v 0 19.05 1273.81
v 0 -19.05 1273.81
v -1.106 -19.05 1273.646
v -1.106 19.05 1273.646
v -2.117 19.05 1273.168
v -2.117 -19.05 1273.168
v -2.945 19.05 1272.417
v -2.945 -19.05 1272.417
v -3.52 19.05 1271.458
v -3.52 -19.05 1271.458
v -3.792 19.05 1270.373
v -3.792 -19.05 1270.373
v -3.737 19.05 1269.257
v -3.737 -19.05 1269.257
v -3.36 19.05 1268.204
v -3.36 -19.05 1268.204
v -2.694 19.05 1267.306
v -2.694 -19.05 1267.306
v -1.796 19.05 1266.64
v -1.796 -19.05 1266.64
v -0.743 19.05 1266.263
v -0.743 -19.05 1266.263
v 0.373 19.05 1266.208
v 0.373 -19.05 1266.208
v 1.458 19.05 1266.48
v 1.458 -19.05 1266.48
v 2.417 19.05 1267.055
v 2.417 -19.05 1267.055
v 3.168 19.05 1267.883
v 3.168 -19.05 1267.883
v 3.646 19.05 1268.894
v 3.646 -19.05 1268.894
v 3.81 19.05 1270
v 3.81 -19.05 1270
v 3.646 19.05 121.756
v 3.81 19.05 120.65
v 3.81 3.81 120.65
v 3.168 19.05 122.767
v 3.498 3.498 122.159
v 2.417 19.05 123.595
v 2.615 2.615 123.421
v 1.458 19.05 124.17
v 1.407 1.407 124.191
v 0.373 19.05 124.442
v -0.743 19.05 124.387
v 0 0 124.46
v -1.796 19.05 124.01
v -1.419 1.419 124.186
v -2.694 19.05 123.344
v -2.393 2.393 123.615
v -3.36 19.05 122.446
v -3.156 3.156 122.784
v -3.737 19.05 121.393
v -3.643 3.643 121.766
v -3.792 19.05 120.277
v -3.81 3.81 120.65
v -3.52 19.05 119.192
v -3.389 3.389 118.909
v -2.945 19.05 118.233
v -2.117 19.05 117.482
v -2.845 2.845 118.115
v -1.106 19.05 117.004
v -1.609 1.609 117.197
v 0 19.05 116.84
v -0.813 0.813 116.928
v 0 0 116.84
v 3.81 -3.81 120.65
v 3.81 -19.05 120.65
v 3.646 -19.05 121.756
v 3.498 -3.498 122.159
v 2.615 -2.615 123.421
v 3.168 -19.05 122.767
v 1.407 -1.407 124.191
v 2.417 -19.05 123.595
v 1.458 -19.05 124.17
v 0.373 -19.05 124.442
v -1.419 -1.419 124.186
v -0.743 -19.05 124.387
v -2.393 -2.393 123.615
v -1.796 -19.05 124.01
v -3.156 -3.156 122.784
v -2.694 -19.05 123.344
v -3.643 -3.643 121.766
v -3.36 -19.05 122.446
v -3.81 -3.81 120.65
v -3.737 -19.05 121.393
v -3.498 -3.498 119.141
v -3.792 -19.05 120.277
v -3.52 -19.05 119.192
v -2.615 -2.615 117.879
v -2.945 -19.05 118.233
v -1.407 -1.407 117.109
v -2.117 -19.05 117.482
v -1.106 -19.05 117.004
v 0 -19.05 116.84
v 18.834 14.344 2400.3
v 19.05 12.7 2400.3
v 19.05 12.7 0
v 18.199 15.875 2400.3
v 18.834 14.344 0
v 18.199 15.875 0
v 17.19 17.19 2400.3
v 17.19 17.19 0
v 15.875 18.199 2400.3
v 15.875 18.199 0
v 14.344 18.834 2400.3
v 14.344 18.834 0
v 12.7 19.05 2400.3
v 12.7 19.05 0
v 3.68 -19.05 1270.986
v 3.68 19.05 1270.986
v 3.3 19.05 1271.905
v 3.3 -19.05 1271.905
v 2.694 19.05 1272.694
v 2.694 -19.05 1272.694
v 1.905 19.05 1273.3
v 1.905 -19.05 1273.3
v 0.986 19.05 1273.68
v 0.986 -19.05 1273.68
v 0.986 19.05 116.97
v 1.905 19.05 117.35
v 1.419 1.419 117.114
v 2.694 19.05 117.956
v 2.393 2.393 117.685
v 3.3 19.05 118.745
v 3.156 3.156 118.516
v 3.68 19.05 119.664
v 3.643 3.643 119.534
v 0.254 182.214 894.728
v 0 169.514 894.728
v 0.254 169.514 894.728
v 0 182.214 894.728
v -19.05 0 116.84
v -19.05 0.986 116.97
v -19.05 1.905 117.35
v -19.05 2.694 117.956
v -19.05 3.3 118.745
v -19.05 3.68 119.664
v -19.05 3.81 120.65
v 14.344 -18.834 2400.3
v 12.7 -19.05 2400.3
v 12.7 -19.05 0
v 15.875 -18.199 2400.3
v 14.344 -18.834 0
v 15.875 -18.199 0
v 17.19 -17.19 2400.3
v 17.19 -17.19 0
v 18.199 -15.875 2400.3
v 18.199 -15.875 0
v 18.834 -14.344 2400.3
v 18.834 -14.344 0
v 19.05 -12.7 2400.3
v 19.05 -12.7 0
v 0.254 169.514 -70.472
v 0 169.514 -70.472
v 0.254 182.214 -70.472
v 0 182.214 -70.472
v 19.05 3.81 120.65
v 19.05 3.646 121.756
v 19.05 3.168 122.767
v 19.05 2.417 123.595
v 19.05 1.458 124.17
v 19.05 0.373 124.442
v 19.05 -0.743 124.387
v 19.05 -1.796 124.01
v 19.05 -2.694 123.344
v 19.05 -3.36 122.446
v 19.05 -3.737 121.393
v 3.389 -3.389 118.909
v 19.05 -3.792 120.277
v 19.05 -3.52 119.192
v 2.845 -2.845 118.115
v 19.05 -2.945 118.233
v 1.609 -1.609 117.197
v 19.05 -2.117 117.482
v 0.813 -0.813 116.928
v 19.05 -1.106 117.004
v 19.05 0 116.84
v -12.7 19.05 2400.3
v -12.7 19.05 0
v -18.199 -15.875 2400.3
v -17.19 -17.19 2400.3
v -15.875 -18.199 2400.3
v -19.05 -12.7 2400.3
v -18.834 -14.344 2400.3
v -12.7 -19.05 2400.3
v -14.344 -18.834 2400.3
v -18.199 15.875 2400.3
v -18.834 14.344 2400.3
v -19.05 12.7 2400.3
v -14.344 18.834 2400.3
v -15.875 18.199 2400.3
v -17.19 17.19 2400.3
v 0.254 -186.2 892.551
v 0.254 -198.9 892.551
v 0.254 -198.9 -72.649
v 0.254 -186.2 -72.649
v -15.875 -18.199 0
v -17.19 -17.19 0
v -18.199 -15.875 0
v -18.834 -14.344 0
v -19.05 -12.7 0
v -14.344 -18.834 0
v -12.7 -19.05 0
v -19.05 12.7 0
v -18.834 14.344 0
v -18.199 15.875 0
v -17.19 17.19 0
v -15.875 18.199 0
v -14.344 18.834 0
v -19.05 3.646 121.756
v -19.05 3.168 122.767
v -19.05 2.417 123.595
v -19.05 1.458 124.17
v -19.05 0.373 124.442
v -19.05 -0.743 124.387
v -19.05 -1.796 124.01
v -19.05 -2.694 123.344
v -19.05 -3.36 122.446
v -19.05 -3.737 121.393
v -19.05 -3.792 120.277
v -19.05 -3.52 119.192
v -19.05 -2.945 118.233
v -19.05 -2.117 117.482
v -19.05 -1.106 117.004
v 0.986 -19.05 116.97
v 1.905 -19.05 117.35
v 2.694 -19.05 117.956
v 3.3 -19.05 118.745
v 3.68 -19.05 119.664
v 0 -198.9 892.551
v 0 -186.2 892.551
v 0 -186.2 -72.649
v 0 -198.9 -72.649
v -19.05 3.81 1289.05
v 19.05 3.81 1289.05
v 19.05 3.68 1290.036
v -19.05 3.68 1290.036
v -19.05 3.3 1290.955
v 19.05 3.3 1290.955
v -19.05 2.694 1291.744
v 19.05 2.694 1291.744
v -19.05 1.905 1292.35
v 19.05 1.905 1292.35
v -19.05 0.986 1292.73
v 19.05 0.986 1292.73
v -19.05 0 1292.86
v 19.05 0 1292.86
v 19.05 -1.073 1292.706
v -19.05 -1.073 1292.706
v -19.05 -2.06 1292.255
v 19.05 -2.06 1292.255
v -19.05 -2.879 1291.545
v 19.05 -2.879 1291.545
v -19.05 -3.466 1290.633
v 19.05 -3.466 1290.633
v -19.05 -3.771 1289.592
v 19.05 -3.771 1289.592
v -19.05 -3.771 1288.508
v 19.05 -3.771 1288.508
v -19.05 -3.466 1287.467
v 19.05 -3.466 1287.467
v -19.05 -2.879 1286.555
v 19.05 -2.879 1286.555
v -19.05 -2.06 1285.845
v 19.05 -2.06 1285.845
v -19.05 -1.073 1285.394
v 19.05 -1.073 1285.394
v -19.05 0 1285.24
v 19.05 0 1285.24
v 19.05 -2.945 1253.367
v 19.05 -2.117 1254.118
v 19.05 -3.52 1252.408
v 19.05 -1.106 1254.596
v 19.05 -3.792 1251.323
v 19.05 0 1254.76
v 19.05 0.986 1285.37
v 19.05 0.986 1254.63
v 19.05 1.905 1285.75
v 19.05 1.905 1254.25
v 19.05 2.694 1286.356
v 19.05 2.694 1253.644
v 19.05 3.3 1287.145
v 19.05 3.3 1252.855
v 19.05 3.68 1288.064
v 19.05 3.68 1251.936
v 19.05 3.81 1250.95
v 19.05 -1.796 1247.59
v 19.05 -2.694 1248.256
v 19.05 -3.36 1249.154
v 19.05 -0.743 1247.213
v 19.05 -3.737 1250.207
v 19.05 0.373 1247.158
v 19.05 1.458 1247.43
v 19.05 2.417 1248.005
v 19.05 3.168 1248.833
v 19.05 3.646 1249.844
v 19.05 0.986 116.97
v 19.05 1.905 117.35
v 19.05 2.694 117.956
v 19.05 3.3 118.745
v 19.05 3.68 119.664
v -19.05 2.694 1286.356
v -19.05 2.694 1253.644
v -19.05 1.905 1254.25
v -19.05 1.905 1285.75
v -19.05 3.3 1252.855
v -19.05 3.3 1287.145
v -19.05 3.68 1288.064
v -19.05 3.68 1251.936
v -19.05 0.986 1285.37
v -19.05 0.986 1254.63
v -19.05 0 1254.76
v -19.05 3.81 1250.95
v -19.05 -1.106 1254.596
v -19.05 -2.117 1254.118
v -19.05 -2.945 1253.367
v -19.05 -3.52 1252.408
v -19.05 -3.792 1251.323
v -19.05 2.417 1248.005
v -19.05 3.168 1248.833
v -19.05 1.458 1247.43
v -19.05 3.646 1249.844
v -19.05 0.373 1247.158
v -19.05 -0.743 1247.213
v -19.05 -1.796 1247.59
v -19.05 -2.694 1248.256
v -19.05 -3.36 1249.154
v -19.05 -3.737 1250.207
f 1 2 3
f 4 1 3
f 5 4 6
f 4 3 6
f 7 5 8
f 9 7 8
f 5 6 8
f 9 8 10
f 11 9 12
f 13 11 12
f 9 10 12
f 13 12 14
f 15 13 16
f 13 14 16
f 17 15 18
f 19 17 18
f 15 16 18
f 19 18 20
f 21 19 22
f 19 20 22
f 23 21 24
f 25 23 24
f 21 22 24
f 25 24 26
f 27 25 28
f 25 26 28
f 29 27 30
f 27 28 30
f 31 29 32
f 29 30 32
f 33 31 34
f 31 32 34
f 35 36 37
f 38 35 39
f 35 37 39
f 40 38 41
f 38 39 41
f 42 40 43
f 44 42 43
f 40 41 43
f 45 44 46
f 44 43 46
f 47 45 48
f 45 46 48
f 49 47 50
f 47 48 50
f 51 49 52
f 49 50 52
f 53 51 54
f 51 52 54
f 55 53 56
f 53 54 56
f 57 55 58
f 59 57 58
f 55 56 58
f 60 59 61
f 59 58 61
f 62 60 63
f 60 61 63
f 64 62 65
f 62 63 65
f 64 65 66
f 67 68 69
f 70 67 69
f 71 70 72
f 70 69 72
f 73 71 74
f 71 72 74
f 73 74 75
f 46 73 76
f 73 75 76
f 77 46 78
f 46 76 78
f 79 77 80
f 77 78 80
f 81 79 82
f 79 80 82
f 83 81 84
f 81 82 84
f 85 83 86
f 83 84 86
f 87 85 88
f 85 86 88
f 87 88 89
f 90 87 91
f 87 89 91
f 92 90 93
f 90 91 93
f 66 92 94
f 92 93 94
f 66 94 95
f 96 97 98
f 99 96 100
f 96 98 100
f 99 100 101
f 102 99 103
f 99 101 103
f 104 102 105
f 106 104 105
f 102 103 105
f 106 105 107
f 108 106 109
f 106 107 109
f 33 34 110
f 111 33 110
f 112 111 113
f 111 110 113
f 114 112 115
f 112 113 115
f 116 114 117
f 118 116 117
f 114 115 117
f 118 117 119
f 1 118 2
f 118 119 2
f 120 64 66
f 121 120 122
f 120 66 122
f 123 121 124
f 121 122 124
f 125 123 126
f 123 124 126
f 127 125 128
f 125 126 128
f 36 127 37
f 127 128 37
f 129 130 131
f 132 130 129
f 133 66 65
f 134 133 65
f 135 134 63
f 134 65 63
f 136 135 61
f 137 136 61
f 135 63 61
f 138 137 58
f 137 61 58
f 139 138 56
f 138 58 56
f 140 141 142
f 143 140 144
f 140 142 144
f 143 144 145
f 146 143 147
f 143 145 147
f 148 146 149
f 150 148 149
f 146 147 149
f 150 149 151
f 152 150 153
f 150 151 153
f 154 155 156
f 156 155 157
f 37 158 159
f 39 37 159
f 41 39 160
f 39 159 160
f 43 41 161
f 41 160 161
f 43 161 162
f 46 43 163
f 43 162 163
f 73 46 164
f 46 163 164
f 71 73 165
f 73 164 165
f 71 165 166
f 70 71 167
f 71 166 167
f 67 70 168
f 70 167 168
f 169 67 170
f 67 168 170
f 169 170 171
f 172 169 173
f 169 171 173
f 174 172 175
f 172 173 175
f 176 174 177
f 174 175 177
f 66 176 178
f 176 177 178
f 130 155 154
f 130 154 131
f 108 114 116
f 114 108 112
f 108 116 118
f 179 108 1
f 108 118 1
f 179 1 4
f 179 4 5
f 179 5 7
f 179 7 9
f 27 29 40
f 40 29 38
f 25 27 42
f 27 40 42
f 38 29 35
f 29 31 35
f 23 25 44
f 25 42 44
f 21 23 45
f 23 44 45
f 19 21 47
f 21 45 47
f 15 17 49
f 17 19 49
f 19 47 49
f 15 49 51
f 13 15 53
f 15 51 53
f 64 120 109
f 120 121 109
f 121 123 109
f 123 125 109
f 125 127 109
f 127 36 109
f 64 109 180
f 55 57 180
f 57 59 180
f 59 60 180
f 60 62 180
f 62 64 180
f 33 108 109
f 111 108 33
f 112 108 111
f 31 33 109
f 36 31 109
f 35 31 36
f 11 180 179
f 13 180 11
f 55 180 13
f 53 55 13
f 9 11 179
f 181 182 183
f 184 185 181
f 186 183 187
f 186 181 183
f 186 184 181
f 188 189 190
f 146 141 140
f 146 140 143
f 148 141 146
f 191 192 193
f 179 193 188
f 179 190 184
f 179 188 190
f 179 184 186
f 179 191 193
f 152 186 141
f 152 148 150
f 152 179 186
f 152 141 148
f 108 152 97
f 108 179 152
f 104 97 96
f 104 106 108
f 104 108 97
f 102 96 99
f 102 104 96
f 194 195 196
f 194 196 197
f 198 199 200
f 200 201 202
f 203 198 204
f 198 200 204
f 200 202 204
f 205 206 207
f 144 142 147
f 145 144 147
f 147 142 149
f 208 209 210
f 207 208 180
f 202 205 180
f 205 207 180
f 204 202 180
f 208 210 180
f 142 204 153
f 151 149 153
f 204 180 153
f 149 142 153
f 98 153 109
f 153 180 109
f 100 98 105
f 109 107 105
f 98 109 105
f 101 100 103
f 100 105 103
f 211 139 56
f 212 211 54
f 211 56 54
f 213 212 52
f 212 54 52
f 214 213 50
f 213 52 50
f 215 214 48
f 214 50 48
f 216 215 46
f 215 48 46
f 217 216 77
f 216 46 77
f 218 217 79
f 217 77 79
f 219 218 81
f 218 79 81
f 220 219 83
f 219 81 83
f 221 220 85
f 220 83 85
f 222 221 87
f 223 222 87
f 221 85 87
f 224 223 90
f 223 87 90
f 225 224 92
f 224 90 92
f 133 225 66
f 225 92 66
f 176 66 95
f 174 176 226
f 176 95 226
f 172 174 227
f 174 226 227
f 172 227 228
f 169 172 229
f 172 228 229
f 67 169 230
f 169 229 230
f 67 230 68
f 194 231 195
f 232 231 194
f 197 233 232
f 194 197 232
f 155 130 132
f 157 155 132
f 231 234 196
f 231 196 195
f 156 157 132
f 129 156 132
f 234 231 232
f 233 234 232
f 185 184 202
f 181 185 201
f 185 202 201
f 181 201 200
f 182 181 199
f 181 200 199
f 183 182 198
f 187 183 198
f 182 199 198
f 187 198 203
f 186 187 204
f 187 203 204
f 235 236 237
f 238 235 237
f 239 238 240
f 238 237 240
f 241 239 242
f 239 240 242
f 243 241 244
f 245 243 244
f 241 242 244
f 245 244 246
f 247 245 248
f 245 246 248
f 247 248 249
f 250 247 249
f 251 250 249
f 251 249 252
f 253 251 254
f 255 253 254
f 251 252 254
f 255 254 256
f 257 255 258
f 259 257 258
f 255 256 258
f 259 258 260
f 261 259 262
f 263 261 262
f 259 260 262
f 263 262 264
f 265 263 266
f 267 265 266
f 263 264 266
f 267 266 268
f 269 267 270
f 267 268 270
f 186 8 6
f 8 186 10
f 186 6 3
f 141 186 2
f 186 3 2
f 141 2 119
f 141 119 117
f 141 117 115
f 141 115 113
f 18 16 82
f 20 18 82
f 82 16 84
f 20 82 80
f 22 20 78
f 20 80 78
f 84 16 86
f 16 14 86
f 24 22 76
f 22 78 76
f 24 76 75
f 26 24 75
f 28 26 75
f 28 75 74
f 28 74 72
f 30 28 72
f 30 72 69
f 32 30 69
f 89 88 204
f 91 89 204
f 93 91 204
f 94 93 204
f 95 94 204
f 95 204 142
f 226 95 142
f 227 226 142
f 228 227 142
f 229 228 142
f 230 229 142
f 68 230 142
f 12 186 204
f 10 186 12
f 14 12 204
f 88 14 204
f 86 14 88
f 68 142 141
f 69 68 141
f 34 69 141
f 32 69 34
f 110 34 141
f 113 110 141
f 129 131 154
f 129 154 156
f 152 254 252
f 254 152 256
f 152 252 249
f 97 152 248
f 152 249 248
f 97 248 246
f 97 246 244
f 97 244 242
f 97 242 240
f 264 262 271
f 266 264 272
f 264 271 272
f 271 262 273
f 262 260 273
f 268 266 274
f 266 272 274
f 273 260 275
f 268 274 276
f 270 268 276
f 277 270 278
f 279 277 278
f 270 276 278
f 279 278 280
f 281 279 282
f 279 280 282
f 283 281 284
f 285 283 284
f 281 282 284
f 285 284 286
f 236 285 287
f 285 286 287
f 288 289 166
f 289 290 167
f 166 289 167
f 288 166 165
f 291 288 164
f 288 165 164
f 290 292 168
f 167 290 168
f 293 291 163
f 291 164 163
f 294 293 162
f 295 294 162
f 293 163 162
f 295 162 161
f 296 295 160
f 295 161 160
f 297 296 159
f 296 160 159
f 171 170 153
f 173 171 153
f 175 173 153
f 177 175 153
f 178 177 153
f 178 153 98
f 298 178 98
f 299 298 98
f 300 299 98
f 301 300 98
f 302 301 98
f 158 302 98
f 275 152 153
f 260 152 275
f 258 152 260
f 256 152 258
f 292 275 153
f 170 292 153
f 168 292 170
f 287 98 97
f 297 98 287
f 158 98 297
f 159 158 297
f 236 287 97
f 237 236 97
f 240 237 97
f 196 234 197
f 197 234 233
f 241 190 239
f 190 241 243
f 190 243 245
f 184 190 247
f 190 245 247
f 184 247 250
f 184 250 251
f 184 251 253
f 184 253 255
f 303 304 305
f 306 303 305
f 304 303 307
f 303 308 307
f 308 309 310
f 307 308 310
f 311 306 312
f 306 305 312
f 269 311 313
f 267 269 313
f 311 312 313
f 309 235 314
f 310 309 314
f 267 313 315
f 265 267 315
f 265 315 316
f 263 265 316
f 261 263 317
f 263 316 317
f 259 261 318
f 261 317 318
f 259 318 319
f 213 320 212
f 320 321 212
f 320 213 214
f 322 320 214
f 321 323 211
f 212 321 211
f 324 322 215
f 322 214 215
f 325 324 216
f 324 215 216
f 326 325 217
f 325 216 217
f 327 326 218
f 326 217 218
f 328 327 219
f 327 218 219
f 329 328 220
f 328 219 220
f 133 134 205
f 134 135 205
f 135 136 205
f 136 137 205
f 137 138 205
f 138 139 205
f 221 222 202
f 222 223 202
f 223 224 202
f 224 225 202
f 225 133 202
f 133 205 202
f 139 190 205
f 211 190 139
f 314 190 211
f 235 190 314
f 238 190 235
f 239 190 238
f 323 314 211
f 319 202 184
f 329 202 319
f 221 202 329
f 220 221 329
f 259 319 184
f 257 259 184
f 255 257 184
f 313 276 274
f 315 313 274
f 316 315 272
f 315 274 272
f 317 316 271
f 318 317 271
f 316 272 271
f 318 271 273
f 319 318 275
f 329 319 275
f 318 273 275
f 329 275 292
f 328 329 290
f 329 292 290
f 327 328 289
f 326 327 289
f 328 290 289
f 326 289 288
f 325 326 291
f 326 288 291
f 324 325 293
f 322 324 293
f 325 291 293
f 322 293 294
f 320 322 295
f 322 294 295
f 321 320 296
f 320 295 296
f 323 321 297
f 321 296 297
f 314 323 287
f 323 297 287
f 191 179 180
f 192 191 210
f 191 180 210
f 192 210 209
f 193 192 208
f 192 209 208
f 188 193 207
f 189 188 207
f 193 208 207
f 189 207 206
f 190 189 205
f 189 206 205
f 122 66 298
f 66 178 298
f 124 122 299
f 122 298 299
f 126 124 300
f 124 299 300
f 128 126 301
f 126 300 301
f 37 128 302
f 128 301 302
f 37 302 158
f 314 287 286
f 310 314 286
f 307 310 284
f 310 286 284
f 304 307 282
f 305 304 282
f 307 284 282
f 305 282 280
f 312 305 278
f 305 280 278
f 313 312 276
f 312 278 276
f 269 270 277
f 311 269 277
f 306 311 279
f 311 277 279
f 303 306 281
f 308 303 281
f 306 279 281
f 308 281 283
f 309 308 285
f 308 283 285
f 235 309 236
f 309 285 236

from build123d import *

# Parameters (mm, degrees)
F1_DEPTH  = 2400.3
F2_W      = 12.7
F2_H      = 965.2
F4_DEPTH  = 0.254
F3_W      = 12.7
F3_H      = 965.2
F5_DEPTH  = 0.254
F7_DEPTH  = 38.1
F9_DEPTH  = 38.1
F11_DEPTH = 38.1
F13_DEPTH = 38.1


with BuildPart() as f1:
    # F0 (on Top) → F1 (new body)
    with BuildSketch(Plane.XY):
        with BuildLine():
            ThreePointArc((19.05, 12.7), (17.190128, 17.190128), (12.7, 19.05))
            Line((12.7, 19.05), (-12.7, 19.05))
            ThreePointArc((-12.7, 19.05), (-17.190128, 17.190128), (-19.05, 12.7))
            Line((-19.05, 12.7), (-19.05, -12.7))
            ThreePointArc((-19.05, -12.7), (-17.190128, -17.190128), (-12.7, -19.05))
            Line((-12.7, -19.05), (12.7, -19.05))
            ThreePointArc((12.7, -19.05), (17.190128, -17.190128), (19.05, -12.7))
            Line((19.05, -12.7), (19.05, 12.7))
        make_face()
    extrude(amount=F1_DEPTH)

    # F6 (on face) → F7 (cut)
    with BuildSketch(Plane.XZ.offset(19.05)):
        with BuildLine():
            ThreePointArc((0, 116.84), (2.694077, 117.955923), (3.81, 120.65))
            ThreePointArc((3.81, 120.65), (-2.694077, 123.344077), (0, 116.84))
        make_face()
    extrude(amount=-F7_DEPTH, mode=Mode.SUBTRACT)

    # F8 (on face) → F9 (cut)
    with BuildSketch(Plane.YZ.offset(19.05)):
        with BuildLine():
            ThreePointArc((0, 116.84), (2.694077, 117.955923), (3.81, 120.65))
            ThreePointArc((3.81, 120.65), (-2.694077, 123.344077), (0, 116.84))
        make_face()
    extrude(amount=-F9_DEPTH, mode=Mode.SUBTRACT)

    # F10 (on face) → F11 (cut)
    with BuildSketch(Plane.YZ.offset(19.05)):
        with BuildLine():
            ThreePointArc((3.81, 1289.05), (2.694077, 1291.744077), (0, 1292.86))
            Line((0, 1292.86), (0, 1289.05))
            Line((0, 1289.05), (0, 1285.24))
            ThreePointArc((0, 1285.24), (2.694077, 1286.355923), (3.81, 1289.05))
        make_face()
        with BuildLine():
            ThreePointArc((3.81, 1250.95), (2.694077, 1253.644077), (0, 1254.76))
            ThreePointArc((0, 1254.76), (-2.694077, 1248.255923), (3.81, 1250.95))
        make_face()
        with BuildLine():
            Line((0, 1289.05), (0, 1292.86))
            ThreePointArc((0, 1292.86), (-3.81, 1289.05), (0, 1285.24))
            Line((0, 1285.24), (0, 1289.05))
        make_face()
    extrude(amount=-F11_DEPTH, mode=Mode.SUBTRACT)

    # F12 (on face) → F13 (cut)
    with BuildSketch(Plane.XZ.offset(19.05)):
        with BuildLine():
            ThreePointArc((0, 1273.81), (-2.694077, 1267.305923), (3.81, 1270))
            ThreePointArc((3.81, 1270), (2.694077, 1272.694077), (0, 1273.81))
        make_face()
    extrude(amount=-F13_DEPTH, mode=Mode.SUBTRACT)


with BuildPart() as f4:
    # F2 (on Right) → F4 (new body)
    with BuildSketch(Plane.YZ):
        with Locations((-192.550282, 409.951065)):
            Rectangle(F2_W, F2_H)
    extrude(amount=F4_DEPTH)


with BuildPart() as f5:
    # F3 (on Right) → F5 (new body)
    with BuildSketch(Plane.YZ):
        with Locations((175.864179, 412.127815)):
            Rectangle(F3_W, F3_H)
    extrude(amount=F5_DEPTH)


solid = Compound([f1.part, f4.part, f5.part])
